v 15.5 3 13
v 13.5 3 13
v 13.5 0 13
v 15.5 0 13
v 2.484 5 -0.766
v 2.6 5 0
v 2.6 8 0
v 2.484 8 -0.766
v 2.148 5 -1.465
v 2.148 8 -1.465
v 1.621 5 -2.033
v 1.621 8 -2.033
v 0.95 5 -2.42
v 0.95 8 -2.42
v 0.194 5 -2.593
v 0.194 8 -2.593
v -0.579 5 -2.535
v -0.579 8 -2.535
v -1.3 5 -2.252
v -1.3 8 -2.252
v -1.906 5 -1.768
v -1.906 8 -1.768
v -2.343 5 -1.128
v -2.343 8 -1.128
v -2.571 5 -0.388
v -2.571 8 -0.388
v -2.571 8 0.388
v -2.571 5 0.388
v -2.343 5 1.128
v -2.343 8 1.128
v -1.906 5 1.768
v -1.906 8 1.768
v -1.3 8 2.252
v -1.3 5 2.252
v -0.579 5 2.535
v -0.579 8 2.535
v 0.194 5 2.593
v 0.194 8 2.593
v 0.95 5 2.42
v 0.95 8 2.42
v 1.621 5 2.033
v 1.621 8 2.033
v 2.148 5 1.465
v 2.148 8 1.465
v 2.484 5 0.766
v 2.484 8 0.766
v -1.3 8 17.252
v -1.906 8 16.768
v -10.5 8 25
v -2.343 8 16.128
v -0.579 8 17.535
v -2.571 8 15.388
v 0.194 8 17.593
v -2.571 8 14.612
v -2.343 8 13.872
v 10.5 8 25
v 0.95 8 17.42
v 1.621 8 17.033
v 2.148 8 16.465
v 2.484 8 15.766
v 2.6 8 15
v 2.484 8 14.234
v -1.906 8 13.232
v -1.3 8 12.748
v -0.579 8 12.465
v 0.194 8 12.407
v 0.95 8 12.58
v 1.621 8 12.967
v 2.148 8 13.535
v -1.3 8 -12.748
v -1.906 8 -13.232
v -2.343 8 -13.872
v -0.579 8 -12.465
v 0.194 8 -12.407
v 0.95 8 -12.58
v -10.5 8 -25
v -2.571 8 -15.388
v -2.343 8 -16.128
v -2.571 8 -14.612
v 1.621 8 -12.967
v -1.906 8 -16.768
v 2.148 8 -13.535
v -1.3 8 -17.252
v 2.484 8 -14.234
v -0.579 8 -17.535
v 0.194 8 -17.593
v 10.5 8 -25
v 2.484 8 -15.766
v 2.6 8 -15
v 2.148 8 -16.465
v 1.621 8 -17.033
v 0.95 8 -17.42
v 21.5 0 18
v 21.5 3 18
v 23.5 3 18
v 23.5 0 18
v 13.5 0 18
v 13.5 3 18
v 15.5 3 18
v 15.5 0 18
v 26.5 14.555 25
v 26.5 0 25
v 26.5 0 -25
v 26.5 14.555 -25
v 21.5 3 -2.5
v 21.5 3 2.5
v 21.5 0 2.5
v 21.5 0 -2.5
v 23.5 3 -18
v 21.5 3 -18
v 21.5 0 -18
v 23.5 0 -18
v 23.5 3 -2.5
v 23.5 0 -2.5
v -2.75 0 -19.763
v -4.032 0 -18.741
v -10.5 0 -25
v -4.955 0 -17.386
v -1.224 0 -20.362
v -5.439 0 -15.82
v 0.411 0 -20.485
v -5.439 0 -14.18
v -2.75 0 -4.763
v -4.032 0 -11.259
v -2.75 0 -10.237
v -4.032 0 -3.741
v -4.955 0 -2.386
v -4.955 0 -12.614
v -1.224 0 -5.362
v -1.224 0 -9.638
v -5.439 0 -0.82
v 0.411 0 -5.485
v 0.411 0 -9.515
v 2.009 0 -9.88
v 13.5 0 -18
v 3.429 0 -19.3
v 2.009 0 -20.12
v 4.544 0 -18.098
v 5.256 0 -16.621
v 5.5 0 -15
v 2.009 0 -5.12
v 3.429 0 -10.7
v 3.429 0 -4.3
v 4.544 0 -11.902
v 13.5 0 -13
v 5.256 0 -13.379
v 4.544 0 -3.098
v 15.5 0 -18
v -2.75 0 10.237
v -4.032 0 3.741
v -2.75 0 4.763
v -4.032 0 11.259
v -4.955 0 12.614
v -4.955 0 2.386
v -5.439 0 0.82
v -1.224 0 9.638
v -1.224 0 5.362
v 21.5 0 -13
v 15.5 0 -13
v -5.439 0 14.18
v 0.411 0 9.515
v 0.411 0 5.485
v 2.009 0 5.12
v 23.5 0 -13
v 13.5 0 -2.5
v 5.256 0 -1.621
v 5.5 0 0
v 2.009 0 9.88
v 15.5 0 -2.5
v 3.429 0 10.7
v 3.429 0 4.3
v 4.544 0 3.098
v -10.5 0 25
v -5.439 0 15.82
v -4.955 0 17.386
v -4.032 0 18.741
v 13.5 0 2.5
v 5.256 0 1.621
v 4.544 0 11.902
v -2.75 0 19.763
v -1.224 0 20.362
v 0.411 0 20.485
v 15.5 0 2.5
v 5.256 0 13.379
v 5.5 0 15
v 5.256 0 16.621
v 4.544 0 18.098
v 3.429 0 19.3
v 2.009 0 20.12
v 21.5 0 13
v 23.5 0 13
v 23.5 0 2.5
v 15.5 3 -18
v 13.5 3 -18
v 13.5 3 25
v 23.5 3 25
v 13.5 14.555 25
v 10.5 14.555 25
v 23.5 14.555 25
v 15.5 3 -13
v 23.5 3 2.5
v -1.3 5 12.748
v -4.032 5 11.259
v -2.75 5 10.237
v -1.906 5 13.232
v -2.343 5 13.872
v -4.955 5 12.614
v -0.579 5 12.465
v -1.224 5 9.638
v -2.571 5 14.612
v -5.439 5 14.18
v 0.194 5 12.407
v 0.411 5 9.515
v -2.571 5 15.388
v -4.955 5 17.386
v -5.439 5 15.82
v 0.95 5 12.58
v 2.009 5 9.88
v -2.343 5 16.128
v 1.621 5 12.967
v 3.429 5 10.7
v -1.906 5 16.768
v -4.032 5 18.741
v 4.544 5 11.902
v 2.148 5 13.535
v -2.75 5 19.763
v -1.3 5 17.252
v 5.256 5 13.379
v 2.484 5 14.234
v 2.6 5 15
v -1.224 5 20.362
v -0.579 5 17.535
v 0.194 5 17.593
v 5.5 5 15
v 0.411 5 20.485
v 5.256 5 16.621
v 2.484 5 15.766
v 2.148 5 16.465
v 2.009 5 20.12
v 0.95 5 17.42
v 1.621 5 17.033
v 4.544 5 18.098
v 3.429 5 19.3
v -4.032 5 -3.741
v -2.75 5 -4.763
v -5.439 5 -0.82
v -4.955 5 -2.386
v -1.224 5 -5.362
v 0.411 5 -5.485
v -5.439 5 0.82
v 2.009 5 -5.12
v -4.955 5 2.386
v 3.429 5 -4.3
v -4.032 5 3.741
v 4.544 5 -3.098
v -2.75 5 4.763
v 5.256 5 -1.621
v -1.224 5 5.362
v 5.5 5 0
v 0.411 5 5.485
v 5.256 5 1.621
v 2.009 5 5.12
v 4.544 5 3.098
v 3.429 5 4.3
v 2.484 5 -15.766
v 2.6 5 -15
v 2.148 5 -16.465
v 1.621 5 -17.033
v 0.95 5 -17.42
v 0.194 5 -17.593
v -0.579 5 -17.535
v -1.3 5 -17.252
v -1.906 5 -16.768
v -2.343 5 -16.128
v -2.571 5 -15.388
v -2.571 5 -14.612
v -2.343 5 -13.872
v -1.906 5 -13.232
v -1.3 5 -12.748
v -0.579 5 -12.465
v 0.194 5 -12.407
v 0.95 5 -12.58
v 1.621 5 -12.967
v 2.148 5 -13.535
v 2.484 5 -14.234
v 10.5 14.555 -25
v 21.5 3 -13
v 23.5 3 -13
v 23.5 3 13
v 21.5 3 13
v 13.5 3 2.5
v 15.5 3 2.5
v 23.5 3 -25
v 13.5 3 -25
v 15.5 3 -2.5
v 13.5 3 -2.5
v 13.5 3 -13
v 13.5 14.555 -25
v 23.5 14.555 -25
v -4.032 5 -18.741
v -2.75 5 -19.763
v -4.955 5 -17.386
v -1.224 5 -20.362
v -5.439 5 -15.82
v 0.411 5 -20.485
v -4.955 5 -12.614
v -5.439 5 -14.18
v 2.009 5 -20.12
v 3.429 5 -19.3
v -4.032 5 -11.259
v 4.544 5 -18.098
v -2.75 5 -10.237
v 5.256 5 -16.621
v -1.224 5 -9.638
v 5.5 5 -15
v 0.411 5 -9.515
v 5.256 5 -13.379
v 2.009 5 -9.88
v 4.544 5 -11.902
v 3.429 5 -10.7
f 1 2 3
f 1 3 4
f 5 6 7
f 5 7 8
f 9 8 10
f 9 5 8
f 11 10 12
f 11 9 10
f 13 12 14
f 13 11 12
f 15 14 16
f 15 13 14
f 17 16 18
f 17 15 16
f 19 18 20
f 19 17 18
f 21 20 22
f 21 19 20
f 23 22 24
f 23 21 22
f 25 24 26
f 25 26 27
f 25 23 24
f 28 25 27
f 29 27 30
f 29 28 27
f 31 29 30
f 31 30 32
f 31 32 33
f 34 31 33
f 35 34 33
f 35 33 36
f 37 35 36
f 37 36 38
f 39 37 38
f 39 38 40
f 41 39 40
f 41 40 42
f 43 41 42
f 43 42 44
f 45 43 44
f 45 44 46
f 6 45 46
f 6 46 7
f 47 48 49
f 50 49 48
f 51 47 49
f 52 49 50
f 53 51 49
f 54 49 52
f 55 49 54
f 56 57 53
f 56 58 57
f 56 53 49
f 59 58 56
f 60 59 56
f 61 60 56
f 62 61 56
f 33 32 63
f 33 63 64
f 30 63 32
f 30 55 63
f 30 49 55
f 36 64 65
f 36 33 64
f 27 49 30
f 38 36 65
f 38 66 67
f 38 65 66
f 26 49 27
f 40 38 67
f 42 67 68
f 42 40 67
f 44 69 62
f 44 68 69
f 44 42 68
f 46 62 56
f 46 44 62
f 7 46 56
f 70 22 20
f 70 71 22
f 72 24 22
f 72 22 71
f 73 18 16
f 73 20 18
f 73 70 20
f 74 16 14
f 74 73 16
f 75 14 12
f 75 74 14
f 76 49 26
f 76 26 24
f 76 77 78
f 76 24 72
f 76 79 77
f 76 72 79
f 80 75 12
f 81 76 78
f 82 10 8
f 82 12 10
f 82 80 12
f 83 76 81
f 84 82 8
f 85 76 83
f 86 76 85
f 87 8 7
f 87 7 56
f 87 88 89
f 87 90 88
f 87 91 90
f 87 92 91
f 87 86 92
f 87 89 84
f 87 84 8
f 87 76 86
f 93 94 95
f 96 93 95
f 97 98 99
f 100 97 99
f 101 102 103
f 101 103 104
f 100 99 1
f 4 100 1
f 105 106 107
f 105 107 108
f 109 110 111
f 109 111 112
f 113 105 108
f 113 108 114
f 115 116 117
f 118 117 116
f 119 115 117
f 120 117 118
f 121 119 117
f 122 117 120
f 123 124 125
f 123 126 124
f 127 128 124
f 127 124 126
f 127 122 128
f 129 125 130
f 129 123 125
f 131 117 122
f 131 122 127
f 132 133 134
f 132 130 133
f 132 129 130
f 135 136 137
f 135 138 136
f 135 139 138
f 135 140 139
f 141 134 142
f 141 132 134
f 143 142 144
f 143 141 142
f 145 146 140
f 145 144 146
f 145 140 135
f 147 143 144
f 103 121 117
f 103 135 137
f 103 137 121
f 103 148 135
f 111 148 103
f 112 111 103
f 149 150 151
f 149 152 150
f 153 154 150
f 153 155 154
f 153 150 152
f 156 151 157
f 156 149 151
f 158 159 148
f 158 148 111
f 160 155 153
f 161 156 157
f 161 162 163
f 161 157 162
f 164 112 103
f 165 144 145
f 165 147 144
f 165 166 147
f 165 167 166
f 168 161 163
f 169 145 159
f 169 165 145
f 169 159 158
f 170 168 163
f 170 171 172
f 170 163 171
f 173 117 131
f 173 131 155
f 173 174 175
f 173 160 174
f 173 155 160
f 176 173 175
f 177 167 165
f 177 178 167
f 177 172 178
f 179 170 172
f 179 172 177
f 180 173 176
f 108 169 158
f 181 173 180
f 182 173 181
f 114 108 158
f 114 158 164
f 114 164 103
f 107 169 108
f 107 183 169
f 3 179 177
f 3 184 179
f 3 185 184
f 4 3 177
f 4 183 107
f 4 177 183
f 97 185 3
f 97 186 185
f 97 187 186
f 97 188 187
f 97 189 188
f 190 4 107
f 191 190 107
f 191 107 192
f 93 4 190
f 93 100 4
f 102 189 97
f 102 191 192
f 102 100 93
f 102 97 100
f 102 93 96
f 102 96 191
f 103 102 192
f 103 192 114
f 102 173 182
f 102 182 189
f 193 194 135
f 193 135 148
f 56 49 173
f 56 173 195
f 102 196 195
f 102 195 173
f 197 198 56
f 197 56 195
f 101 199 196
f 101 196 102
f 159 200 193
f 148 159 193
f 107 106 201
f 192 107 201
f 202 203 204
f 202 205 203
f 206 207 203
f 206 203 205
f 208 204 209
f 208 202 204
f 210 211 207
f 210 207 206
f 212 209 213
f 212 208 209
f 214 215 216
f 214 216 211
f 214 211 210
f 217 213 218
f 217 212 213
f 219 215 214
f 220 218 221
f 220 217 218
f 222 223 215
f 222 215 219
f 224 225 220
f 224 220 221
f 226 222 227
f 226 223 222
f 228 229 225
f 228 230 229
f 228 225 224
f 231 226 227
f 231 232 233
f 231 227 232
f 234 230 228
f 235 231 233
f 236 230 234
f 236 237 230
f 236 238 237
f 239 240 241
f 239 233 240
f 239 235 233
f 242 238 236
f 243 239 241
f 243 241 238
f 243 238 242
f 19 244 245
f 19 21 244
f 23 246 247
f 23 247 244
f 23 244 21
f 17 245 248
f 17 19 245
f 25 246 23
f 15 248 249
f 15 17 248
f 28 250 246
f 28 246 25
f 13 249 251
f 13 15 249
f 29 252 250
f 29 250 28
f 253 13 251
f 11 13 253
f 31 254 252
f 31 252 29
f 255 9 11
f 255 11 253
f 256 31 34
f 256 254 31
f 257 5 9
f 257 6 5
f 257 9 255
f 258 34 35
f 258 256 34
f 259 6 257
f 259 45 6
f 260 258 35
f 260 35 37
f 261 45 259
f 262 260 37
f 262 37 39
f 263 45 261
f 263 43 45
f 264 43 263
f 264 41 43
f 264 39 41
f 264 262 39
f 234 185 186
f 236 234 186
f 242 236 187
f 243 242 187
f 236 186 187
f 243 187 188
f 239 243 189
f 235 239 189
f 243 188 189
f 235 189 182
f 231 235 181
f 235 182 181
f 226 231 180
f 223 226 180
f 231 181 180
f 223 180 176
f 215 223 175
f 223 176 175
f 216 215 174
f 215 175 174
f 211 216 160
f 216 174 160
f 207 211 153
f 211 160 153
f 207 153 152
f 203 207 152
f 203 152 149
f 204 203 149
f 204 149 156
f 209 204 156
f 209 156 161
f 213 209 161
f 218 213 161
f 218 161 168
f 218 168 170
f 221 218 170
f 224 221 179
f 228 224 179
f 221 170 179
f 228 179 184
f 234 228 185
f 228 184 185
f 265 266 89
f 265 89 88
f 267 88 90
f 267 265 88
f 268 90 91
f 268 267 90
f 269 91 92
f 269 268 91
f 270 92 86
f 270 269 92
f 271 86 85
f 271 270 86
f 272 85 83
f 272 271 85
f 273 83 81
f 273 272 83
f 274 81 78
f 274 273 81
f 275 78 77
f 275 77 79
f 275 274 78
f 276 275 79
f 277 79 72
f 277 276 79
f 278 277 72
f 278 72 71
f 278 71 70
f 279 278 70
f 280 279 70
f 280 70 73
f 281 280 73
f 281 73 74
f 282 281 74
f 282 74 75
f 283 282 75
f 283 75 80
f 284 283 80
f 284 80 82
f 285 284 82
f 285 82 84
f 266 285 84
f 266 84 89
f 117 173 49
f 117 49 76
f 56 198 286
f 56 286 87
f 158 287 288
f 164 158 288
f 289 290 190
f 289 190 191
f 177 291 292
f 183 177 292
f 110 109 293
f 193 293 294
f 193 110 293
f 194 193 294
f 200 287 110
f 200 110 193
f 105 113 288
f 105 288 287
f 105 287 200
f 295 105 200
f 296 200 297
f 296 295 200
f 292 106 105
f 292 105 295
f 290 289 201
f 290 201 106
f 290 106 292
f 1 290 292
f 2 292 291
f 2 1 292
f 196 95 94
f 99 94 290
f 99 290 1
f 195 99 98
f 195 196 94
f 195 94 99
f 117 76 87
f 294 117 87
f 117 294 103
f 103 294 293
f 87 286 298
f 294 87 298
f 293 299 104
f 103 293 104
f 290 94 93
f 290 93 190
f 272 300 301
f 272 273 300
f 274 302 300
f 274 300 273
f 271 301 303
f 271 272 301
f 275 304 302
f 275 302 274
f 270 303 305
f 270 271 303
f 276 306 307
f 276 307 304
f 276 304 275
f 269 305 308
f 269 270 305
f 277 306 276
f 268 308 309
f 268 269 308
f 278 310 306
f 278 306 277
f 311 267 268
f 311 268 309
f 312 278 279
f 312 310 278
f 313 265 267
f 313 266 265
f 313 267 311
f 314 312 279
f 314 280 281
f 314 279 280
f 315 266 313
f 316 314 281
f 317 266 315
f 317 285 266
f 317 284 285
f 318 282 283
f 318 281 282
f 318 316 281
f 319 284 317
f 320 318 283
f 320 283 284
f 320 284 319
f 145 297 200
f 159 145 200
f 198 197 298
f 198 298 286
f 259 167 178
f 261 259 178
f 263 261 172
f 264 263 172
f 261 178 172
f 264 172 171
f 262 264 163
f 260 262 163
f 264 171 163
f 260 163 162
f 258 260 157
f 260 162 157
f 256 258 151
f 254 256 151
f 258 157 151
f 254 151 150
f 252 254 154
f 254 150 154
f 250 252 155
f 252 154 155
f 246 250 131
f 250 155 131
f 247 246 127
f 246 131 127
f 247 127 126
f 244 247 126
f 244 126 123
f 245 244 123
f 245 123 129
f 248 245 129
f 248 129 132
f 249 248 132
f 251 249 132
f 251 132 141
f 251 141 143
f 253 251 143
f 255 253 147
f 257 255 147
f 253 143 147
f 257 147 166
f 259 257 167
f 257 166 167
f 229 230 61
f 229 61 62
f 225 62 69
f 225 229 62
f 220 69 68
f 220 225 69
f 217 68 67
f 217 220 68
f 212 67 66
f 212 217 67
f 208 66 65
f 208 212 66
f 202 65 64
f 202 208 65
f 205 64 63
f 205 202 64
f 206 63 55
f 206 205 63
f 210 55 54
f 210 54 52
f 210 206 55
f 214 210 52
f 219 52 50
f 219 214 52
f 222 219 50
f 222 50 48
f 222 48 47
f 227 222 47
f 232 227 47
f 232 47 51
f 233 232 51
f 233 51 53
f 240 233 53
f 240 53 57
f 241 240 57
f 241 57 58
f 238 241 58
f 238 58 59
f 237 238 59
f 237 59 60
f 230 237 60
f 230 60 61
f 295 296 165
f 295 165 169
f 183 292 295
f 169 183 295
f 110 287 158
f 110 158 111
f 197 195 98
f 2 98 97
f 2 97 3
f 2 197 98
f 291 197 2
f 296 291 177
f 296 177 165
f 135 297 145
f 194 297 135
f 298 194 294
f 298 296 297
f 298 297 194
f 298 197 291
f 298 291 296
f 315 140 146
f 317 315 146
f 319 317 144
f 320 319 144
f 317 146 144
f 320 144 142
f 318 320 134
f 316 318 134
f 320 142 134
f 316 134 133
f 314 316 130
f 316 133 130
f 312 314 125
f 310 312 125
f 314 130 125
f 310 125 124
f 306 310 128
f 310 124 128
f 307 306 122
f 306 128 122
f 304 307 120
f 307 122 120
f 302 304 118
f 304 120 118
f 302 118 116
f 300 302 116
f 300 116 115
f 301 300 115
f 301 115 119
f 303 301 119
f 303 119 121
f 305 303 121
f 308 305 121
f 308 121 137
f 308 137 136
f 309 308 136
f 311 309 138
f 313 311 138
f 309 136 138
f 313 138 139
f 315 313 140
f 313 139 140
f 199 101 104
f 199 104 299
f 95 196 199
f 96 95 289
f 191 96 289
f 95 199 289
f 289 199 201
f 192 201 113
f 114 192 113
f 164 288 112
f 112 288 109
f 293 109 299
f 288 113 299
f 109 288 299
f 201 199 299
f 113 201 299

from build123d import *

# Parameters (mm, degrees)
SKETCH1_W           = 21
SKETCH1_H           = 50
SKETCH1_R           = 2.6
BOSS_EXTRUDE1_DEPTH = 8
SKETCH2_R           = 5.5
CUT_EXTRUDE1_DEPTH  = 5
BOSS_EXTRUDE2_DEPTH = 50
CUT_EXTRUDE2_REACH  = 5
SKETCH4_W           = 2
SKETCH4_H           = 5


with BuildPart() as part:
    # Sketch1 → Boss-Extrude1 (new body)
    with BuildSketch(Plane(origin=(0, 0, 0), x_dir=(1, 0, 0), z_dir=(0, 1, 0))):
        Rectangle(SKETCH1_W, SKETCH1_H)
        with Locations((0, -15)):
            Circle(SKETCH1_R, mode=Mode.SUBTRACT)
        Circle(SKETCH1_R, mode=Mode.SUBTRACT)
        with Locations((0, 15)):
            Circle(SKETCH1_R, mode=Mode.SUBTRACT)
    extrude(amount=BOSS_EXTRUDE1_DEPTH)

    # Sketch2 → Cut-Extrude1 (cut)
    with BuildSketch(Plane.XZ):
        Circle(SKETCH2_R)
        with Locations((0, 15)):
            Circle(SKETCH2_R)
        with Locations((0, -15)):
            Circle(SKETCH2_R)
    extrude(amount=-CUT_EXTRUDE1_DEPTH, mode=Mode.SUBTRACT)

    # Sketch3 → Boss-Extrude2 (add)
    with BuildSketch(Plane.XY.offset(25)):
        Polygon((10.5, 8), (10.5, 0), (26.5, 0), (26.5, 14.555402141), (23.5, 14.555402141), (23.5, 3), (13.5, 3), (13.5, 14.555402141), (10.5, 14.555402141), align=None)
    extrude(amount=-BOSS_EXTRUDE2_DEPTH)

    # Sketch4 → Cut-Extrude2 (cut, up to next)
    with BuildSketch(Plane(origin=(0, 3, 0), x_dir=(1, 0, 0), z_dir=(0, 1, 0)), mode=Mode.PRIVATE) as cut_extrude2_sk1:
        with Locations((14.5, -15.5)):
            Rectangle(SKETCH4_W, SKETCH4_H)
    cut_extrude2_tool1 = extrude(cut_extrude2_sk1.sketch, amount=-CUT_EXTRUDE2_REACH, mode=Mode.PRIVATE) & part.part
    add(cut_extrude2_tool1.solids().sort_by_distance((14.5, 3, 15.5))[0], mode=Mode.SUBTRACT)
    # Sketch4 → Cut-Extrude2 (cut, up to next)
    with BuildSketch(Plane(origin=(0, 3, 0), x_dir=(1, 0, 0), z_dir=(0, 1, 0)), mode=Mode.PRIVATE) as cut_extrude2_sk2:
        with Locations((14.5, 15.5)):
            Rectangle(SKETCH4_W, SKETCH4_H)
    cut_extrude2_tool2 = extrude(cut_extrude2_sk2.sketch, amount=-CUT_EXTRUDE2_REACH, mode=Mode.PRIVATE) & part.part
    add(cut_extrude2_tool2.solids().sort_by_distance((14.5, 3, -15.5))[0], mode=Mode.SUBTRACT)
    # Sketch4 → Cut-Extrude2 (cut, up to next)
    with BuildSketch(Plane(origin=(0, 3, 0), x_dir=(1, 0, 0), z_dir=(0, 1, 0)), mode=Mode.PRIVATE) as cut_extrude2_sk3:
        with Locations((22.5, 0)):
            Rectangle(SKETCH4_W, SKETCH4_H)
    cut_extrude2_tool3 = extrude(cut_extrude2_sk3.sketch, amount=-CUT_EXTRUDE2_REACH, mode=Mode.PRIVATE) & part.part
    add(cut_extrude2_tool3.solids().sort_by_distance((22.5, 3, 0))[0], mode=Mode.SUBTRACT)
    # Sketch4 → Cut-Extrude2 (cut, up to next)
    with BuildSketch(Plane(origin=(0, 3, 0), x_dir=(1, 0, 0), z_dir=(0, 1, 0)), mode=Mode.PRIVATE) as cut_extrude2_sk4:
        with Locations((14.5, 0)):
            Rectangle(SKETCH4_W, SKETCH4_H)
    cut_extrude2_tool4 = extrude(cut_extrude2_sk4.sketch, amount=-CUT_EXTRUDE2_REACH, mode=Mode.PRIVATE) & part.part
    add(cut_extrude2_tool4.solids().sort_by_distance((14.5, 3, 0))[0], mode=Mode.SUBTRACT)
    # Sketch4 → Cut-Extrude2 (cut, up to next)
    with BuildSketch(Plane(origin=(0, 3, 0), x_dir=(1, 0, 0), z_dir=(0, 1, 0)), mode=Mode.PRIVATE) as cut_extrude2_sk5:
        with Locations((22.5, 15.5)):
            Rectangle(SKETCH4_W, SKETCH4_H)
    cut_extrude2_tool5 = extrude(cut_extrude2_sk5.sketch, amount=-CUT_EXTRUDE2_REACH, mode=Mode.PRIVATE) & part.part
    add(cut_extrude2_tool5.solids().sort_by_distance((22.5, 3, -15.5))[0], mode=Mode.SUBTRACT)
    # Sketch4 → Cut-Extrude2 (cut, up to next)
    with BuildSketch(Plane(origin=(0, 3, 0), x_dir=(1, 0, 0), z_dir=(0, 1, 0)), mode=Mode.PRIVATE) as cut_extrude2_sk6:
        with Locations((22.5, -15.5)):
            Rectangle(SKETCH4_W, SKETCH4_H)
    cut_extrude2_tool6 = extrude(cut_extrude2_sk6.sketch, amount=-CUT_EXTRUDE2_REACH, mode=Mode.PRIVATE) & part.part
    add(cut_extrude2_tool6.solids().sort_by_distance((22.5, 3, 15.5))[0], mode=Mode.SUBTRACT)


solid = part.part
